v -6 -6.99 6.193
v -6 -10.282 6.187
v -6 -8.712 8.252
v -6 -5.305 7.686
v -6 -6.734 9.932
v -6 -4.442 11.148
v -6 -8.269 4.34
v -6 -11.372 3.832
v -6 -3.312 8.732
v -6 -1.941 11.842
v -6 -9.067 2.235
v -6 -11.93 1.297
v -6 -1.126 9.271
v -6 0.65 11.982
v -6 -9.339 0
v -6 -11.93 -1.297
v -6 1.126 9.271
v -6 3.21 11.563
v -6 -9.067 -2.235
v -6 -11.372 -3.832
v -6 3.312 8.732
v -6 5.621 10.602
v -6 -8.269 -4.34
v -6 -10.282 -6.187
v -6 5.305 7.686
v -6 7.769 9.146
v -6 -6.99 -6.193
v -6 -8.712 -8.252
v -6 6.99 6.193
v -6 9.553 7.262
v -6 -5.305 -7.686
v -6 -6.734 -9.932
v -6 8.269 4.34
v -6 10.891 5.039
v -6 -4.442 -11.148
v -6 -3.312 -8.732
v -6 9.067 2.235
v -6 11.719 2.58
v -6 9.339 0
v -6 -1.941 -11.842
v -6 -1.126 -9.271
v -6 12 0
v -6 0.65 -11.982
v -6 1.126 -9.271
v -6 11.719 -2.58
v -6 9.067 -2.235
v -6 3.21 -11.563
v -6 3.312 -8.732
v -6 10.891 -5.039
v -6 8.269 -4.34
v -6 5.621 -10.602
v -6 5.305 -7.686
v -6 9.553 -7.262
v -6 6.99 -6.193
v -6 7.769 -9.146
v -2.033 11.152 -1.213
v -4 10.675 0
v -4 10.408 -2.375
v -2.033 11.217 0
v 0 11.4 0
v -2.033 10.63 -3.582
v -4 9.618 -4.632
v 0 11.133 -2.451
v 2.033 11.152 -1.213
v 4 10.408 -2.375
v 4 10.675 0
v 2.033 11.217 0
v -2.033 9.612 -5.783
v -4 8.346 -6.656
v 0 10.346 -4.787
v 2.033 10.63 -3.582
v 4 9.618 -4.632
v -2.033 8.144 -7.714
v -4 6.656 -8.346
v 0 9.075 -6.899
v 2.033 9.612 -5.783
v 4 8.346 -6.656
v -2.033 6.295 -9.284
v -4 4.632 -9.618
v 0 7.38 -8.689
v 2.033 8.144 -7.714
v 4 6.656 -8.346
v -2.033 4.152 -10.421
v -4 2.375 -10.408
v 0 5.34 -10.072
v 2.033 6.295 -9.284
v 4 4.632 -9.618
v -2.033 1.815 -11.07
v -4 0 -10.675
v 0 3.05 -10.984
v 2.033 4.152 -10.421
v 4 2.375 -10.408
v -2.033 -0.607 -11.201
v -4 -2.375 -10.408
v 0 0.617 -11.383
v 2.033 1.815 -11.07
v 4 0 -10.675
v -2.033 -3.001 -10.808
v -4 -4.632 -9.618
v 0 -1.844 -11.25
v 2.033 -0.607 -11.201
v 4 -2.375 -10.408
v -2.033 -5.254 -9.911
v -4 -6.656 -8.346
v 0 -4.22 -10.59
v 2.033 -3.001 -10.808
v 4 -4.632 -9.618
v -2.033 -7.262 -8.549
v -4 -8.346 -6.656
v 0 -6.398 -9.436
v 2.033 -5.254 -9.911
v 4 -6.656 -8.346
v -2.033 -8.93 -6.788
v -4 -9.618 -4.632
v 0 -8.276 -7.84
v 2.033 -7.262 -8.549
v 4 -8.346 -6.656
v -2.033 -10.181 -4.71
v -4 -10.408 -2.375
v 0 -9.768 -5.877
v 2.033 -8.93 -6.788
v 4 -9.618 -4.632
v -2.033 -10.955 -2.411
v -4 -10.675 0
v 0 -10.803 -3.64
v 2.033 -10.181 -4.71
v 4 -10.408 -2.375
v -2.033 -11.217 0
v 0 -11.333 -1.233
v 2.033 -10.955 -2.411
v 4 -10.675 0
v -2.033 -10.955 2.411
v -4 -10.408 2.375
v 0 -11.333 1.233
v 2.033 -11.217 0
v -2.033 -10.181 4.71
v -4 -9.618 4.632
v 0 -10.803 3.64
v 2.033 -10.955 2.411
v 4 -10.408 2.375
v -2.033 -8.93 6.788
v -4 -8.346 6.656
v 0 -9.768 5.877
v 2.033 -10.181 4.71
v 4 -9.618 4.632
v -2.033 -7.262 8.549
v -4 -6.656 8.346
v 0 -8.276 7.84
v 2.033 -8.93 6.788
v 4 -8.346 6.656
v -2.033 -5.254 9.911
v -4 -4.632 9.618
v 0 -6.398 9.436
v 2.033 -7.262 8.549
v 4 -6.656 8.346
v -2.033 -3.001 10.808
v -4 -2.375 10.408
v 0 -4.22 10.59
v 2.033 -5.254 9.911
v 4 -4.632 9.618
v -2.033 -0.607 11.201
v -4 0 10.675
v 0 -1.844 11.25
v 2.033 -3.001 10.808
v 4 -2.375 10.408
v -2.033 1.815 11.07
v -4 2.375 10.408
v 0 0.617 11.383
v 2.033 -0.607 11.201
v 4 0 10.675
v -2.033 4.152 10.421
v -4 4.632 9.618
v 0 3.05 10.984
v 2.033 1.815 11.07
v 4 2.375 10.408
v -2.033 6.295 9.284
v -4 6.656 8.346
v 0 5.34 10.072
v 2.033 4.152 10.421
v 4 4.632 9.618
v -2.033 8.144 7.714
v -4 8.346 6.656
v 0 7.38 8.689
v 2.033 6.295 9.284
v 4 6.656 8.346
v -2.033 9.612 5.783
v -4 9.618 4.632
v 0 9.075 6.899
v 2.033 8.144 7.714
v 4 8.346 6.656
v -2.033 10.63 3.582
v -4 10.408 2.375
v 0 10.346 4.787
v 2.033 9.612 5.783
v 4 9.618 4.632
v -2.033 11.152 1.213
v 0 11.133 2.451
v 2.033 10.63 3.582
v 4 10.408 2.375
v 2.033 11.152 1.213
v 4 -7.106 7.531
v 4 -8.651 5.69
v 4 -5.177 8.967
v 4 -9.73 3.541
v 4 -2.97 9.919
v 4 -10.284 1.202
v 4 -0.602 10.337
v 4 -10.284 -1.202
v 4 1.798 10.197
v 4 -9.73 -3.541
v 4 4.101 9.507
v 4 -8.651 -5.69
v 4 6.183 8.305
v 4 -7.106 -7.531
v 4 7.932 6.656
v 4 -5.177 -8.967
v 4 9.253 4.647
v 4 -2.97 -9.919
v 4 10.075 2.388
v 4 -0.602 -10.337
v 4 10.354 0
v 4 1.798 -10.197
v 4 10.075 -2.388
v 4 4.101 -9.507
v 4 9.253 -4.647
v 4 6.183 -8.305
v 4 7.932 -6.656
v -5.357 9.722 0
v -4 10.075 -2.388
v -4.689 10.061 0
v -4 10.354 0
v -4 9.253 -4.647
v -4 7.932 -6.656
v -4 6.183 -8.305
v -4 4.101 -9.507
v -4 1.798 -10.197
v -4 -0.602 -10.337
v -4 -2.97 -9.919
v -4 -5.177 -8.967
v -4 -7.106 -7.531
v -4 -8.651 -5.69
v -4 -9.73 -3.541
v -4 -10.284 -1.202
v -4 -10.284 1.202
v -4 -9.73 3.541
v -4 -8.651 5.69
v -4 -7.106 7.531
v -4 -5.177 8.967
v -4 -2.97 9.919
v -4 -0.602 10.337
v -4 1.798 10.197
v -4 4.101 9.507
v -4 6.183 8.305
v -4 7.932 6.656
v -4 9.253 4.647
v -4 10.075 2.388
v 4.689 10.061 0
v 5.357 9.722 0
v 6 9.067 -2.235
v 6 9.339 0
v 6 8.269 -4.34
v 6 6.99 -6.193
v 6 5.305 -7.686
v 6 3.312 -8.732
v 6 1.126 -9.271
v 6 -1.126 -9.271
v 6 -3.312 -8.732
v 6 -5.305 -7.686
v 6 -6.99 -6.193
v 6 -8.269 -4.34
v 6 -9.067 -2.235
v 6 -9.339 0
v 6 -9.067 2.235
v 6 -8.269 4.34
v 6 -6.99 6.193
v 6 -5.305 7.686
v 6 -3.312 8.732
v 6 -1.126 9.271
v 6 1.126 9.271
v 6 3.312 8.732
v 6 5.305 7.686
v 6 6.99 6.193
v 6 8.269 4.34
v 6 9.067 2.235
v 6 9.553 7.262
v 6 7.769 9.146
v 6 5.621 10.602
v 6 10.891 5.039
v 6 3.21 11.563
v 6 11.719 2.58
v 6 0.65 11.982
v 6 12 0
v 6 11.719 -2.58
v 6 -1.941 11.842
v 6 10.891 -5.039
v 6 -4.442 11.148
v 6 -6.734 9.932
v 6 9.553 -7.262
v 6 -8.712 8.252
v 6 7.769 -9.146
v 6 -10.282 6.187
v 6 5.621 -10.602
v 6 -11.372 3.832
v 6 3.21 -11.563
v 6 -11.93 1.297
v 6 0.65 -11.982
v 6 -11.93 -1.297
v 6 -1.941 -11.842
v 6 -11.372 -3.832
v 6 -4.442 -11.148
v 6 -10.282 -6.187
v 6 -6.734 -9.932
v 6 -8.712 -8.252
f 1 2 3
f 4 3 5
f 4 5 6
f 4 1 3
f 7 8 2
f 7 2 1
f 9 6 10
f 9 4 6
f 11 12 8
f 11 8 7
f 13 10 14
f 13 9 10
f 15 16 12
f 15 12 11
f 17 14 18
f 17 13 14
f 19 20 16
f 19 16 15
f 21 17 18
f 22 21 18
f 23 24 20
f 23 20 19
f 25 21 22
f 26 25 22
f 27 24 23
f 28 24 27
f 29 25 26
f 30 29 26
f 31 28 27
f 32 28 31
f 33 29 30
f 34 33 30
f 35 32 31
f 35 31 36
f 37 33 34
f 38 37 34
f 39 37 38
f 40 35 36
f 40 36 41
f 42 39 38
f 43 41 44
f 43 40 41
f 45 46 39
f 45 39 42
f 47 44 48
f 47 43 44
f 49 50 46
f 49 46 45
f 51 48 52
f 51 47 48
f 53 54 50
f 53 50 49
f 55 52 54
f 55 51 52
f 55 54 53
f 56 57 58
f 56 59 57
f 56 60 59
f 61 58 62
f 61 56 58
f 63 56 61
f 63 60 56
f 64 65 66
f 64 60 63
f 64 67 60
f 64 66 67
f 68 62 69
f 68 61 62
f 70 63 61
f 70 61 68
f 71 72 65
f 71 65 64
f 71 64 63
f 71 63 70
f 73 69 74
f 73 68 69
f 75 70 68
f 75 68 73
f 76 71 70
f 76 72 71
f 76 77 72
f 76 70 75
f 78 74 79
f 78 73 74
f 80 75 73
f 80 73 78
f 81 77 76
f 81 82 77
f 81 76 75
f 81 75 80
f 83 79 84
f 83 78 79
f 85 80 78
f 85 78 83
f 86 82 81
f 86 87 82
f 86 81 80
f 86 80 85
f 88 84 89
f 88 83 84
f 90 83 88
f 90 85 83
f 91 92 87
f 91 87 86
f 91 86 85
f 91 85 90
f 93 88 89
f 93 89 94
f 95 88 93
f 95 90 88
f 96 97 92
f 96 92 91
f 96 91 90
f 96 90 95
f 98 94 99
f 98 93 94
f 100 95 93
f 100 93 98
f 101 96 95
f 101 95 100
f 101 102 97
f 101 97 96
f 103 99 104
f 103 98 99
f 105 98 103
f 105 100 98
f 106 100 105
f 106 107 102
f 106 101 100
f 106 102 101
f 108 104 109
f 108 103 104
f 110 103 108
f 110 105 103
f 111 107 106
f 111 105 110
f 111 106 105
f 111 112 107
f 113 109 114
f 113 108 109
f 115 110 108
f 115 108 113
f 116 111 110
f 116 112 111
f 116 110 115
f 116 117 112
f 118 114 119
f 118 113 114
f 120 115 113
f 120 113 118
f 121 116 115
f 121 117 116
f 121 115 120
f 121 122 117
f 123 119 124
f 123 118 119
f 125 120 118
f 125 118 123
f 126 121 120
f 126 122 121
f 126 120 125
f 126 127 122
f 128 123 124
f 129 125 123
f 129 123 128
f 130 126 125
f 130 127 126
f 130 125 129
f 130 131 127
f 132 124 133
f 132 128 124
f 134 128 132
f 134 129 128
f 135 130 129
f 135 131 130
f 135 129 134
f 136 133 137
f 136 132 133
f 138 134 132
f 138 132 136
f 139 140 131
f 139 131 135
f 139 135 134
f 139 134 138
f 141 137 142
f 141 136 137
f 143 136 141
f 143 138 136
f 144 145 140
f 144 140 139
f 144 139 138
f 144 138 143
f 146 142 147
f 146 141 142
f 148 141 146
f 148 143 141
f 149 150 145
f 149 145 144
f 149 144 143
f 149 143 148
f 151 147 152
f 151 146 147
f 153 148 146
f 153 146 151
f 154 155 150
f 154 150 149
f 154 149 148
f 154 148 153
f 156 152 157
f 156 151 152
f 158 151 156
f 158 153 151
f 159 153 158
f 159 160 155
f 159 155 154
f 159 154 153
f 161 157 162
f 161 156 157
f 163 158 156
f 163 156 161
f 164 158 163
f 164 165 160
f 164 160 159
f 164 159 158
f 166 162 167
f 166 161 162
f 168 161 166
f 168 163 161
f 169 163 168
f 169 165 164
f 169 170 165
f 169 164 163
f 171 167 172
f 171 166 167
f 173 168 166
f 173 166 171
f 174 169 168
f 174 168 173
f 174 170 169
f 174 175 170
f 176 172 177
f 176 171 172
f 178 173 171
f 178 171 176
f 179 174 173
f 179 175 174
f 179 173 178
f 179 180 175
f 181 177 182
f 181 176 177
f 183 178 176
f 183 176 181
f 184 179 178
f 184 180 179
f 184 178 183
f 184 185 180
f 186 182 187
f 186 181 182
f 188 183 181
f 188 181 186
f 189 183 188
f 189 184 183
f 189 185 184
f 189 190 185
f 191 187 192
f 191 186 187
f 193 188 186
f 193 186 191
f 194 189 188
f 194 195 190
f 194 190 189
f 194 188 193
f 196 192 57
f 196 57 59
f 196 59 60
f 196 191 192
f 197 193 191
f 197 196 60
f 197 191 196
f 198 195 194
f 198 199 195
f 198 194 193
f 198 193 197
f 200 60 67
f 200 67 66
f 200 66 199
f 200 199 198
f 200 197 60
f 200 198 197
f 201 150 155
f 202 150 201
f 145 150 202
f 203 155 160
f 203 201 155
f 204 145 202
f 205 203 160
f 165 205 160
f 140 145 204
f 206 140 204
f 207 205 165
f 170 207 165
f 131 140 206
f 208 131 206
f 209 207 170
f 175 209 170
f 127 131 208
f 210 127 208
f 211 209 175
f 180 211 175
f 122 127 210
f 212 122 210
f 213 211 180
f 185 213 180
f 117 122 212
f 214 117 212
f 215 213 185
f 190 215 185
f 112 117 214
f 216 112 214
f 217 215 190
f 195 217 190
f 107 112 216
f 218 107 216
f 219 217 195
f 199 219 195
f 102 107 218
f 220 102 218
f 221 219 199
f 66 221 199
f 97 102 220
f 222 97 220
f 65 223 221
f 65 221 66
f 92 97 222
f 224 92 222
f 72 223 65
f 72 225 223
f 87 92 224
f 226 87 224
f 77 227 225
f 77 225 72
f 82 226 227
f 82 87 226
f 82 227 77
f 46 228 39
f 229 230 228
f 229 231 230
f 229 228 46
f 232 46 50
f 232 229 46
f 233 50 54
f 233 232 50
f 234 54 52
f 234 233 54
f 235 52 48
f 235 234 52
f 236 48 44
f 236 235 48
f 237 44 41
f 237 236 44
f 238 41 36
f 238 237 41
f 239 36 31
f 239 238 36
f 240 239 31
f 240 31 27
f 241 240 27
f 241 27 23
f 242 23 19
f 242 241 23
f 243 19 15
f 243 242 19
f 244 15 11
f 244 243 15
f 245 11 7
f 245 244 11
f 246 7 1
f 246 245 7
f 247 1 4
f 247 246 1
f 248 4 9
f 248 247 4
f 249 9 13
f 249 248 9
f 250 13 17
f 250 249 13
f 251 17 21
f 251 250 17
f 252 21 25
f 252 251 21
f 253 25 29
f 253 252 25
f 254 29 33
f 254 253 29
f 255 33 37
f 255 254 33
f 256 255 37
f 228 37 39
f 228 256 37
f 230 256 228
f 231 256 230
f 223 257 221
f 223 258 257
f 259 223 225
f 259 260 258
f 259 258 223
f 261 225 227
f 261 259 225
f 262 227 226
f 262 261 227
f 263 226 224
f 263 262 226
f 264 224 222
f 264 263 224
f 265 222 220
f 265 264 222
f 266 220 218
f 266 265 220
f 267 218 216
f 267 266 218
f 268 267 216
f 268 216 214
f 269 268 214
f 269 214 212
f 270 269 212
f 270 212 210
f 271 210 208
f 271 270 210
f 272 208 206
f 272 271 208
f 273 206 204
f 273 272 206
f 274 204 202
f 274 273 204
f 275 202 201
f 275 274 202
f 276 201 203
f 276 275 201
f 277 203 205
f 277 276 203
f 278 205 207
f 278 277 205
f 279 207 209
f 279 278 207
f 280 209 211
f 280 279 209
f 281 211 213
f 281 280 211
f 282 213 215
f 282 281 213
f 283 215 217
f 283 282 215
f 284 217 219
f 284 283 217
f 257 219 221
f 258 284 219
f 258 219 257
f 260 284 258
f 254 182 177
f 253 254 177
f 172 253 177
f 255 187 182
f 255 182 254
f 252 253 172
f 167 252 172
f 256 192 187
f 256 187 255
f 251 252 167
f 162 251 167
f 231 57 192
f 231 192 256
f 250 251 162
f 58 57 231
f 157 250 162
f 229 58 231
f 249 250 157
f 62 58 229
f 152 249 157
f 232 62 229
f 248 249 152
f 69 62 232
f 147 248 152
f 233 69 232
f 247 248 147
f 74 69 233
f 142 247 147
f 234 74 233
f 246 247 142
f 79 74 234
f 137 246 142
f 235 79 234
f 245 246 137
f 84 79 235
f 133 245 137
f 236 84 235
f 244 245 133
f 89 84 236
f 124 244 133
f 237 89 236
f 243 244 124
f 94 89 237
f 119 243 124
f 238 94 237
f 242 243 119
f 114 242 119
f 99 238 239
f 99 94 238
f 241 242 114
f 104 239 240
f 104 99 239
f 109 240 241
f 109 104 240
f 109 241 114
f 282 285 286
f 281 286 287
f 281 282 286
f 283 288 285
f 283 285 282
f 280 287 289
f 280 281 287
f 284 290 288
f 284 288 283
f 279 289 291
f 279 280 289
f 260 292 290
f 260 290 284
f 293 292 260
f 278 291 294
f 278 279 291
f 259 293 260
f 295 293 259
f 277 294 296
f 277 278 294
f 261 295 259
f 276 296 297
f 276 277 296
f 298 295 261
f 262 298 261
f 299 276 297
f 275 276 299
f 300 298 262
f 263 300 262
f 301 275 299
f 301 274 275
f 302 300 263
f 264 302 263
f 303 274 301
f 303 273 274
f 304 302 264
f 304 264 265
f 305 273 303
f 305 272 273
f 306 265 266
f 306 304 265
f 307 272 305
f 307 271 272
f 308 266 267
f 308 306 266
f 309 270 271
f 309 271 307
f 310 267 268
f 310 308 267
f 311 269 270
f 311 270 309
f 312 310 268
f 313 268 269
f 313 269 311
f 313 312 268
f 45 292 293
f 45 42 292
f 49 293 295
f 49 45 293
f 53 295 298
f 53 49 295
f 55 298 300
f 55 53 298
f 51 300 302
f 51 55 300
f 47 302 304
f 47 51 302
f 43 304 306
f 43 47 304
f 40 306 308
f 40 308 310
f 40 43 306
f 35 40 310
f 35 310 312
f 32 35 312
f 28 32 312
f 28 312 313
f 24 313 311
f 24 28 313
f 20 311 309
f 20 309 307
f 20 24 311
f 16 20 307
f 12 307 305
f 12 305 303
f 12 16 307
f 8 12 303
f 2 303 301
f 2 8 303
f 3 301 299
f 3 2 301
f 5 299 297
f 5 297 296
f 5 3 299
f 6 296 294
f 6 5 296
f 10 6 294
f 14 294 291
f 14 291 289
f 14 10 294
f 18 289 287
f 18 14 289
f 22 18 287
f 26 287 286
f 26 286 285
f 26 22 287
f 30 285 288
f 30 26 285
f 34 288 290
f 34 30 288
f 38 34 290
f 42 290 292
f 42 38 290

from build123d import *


with BuildPart() as part:
    # Sketch1 → Revolve1 (revolve)
    with BuildSketch(Plane.XY):
        with BuildLine():
            Line((6, 12), (-6, 12))
            Line((-6, 12), (-6, 9.33862945))
            ThreePointArc((-6, 9.33862945), (-5.025719768, 9.897077388), (-4, 10.35422619))
            Line((-4, 10.35422619), (-4, 10.675204916))
            ThreePointArc((-4, 10.675204916), (0, 11.4), (4, 10.675204916))
            Line((4, 10.675204916), (4, 10.35422619))
            ThreePointArc((4, 10.35422619), (5.025719768, 9.897077388), (6, 9.33862945))
            Line((6, 9.33862945), (6, 12))
        make_face()
    revolve(axis=Axis((48.348883339, 0, 0), (-1, 0, 0)))


solid = part.part
